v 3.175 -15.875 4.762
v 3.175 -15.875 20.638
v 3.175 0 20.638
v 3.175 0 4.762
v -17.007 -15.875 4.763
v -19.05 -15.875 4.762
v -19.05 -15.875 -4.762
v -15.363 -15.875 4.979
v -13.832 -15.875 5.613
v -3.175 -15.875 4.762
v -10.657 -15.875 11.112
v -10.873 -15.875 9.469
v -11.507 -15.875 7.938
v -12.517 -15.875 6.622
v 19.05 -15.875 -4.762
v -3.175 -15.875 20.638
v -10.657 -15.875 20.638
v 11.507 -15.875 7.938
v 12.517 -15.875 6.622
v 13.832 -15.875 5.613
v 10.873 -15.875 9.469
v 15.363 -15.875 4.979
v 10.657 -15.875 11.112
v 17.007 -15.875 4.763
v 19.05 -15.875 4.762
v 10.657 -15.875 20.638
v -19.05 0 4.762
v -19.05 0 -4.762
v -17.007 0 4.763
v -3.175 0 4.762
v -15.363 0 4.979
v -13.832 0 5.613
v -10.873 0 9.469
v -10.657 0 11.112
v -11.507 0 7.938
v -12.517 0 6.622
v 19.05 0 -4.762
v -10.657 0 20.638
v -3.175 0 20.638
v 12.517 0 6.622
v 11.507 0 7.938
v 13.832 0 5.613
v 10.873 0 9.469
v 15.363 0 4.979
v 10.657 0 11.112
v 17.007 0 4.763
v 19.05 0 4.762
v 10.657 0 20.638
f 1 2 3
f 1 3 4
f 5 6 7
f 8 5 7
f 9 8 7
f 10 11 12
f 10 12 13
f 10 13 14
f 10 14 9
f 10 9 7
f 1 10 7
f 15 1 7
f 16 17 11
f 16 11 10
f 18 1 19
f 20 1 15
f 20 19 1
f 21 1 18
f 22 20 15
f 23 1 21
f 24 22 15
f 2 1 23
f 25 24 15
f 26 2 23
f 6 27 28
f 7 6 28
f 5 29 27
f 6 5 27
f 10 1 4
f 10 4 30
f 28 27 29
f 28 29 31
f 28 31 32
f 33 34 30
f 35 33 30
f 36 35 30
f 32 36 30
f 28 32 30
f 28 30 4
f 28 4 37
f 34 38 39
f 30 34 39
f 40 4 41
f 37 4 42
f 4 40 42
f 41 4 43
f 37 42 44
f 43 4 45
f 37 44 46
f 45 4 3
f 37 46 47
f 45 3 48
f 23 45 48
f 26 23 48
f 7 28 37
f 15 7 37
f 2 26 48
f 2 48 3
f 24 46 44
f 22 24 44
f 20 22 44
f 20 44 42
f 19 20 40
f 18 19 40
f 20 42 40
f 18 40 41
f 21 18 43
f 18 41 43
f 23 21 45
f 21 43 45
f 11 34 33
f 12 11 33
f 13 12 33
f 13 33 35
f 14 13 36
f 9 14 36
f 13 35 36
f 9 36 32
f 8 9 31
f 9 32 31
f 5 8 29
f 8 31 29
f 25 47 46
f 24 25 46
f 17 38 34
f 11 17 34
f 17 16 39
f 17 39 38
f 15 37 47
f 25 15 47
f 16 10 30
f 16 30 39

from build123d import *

# Parameters (mm, degrees)
F1_DEPTH = 15.875


with BuildPart() as f1:
    # F0 (on Front) → F1 (new body)
    with BuildSketch(Plane.XZ):
        with BuildLine():
            Line((-17.006651, 4.7625), (-19.05, 4.7625))
            Line((-19.05, 4.7625), (-19.05, -4.7625))
            Line((-19.05, -4.7625), (19.05, -4.7625))
            Line((19.05, -4.7625), (19.05, 4.7625))
            Line((19.05, 4.7625), (17.006651, 4.7625))
            ThreePointArc((17.006651, 4.7625), (12.516523, 6.622372), (10.656651, 11.1125))
            Line((10.656651, 11.1125), (10.656651, 20.6375))
            Line((10.656651, 20.6375), (3.175, 20.6375))
            Line((3.175, 20.6375), (3.175, 4.7625))
            Line((3.175, 4.7625), (-3.175, 4.7625))
            Line((-3.175, 4.7625), (-3.175, 20.6375))
            Line((-3.175, 20.6375), (-10.656651, 20.6375))
            Line((-10.656651, 20.6375), (-10.656651, 11.1125))
            ThreePointArc((-10.656651, 11.1125), (-12.516523, 6.622372), (-17.006651, 4.7625))
        make_face()
    extrude(amount=F1_DEPTH)


solid = f1.part
